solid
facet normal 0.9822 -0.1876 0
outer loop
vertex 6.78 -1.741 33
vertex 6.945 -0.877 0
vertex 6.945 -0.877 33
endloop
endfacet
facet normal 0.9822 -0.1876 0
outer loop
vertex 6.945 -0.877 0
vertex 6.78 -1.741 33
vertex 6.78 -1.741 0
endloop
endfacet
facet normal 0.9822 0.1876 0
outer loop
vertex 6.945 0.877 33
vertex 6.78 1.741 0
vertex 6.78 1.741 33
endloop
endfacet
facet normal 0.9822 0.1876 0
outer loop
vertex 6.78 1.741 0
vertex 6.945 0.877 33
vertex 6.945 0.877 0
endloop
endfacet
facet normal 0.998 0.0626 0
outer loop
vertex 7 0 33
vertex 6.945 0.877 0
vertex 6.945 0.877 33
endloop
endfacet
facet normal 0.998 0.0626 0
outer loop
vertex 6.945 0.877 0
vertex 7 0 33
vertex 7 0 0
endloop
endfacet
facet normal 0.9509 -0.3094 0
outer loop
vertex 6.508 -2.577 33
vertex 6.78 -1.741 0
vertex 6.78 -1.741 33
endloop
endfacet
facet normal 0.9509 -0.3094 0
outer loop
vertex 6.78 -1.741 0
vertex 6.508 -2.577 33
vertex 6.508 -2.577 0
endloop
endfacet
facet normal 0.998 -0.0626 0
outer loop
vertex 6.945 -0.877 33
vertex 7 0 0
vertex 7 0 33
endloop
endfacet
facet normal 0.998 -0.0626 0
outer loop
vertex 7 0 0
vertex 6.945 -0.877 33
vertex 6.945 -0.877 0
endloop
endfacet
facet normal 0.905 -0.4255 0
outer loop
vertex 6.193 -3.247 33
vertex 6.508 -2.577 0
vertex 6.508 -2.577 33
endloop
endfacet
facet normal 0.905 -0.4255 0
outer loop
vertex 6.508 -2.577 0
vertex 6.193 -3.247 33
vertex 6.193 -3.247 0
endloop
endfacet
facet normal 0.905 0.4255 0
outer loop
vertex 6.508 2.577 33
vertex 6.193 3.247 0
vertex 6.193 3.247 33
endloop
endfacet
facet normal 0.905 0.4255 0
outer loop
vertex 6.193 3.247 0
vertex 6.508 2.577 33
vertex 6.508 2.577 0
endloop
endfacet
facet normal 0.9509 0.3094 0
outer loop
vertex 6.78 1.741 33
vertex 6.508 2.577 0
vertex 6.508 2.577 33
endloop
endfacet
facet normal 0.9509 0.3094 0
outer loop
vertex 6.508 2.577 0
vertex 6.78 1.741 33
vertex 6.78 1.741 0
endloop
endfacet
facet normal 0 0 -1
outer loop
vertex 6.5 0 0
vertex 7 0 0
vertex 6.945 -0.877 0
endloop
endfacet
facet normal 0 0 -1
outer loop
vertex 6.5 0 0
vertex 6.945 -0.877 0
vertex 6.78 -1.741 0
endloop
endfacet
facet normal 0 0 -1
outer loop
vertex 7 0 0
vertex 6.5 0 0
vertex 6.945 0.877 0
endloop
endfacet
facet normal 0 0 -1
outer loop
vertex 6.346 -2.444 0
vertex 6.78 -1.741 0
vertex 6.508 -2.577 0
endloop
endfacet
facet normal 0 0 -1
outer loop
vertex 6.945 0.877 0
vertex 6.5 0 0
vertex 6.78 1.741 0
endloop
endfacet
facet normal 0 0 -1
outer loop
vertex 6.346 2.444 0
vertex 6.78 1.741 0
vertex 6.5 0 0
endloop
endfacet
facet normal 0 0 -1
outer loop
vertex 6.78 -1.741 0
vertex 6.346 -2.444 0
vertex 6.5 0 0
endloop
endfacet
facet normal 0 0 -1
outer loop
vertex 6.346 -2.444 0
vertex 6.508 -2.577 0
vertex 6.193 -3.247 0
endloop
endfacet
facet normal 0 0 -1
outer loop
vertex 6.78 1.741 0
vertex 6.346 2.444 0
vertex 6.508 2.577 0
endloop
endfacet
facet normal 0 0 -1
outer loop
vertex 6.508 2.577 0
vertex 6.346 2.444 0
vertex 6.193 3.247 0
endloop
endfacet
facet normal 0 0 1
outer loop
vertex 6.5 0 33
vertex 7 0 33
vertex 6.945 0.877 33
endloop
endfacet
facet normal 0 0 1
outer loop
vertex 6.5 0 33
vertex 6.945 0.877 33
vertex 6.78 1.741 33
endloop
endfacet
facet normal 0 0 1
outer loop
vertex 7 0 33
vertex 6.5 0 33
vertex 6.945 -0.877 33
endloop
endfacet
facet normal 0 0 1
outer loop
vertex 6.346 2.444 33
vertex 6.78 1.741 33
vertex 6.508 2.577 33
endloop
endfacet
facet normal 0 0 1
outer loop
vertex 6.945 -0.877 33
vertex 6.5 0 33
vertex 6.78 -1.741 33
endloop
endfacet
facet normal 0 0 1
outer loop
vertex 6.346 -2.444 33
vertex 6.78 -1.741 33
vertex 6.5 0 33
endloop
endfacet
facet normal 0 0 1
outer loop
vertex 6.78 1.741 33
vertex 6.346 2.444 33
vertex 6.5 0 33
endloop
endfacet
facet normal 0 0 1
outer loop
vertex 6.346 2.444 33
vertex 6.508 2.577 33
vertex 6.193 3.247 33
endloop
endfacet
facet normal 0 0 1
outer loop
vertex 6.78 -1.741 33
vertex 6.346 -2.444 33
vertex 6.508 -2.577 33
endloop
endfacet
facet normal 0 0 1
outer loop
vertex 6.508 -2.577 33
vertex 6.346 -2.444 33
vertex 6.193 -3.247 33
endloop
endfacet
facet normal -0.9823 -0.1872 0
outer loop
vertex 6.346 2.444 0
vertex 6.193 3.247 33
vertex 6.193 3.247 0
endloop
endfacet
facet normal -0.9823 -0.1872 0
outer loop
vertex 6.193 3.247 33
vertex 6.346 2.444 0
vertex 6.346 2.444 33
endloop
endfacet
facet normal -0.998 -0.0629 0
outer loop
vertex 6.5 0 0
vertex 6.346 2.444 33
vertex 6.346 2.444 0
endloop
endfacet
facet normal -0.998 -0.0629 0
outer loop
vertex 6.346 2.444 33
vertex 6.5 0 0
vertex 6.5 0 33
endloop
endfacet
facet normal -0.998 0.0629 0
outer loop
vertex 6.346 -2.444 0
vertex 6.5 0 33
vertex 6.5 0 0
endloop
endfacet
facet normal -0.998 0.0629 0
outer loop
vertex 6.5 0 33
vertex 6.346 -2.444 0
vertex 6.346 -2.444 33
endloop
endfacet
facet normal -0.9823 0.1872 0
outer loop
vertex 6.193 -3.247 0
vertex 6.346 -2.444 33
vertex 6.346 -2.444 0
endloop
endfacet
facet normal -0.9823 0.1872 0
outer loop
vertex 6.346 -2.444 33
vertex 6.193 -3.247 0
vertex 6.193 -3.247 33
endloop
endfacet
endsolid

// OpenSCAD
$fn = 50;


difference() {
	union() {
		cylinder(h = 33, r = 7.0000000000);
		translate(v = [-16.0000000000, 0, 0]) {
			cylinder(h = 33, r = 7.0000000000);
		}
	}
	union() {
		cylinder(h = 33, r = 3.2500000000);
		cylinder(h = 33, r = 1.8000000000);
		cylinder(h = 33, r = 1.8000000000);
		cylinder(h = 33, r = 1.8000000000);
		translate(v = [-20.5000000000, 0, 0]) {
			hull() {
				translate(v = [-3.7500000000, 0.0000000000, 0]) {
					cylinder(h = 33, r = 10.5000000000);
				}
				translate(v = [3.7500000000, 0.0000000000, 0]) {
					cylinder(h = 33, r = 10.5000000000);
				}
				translate(v = [-3.7500000000, -0.0000000000, 0]) {
					cylinder(h = 33, r = 10.5000000000);
				}
				translate(v = [3.7500000000, -0.0000000000, 0]) {
					cylinder(h = 33, r = 10.5000000000);
				}
			}
		}
		translate(v = [-13.0000000000, 0, 0.0000000000]) {
			cylinder(h = 33, r = 19.5000000000);
		}
	}
}
